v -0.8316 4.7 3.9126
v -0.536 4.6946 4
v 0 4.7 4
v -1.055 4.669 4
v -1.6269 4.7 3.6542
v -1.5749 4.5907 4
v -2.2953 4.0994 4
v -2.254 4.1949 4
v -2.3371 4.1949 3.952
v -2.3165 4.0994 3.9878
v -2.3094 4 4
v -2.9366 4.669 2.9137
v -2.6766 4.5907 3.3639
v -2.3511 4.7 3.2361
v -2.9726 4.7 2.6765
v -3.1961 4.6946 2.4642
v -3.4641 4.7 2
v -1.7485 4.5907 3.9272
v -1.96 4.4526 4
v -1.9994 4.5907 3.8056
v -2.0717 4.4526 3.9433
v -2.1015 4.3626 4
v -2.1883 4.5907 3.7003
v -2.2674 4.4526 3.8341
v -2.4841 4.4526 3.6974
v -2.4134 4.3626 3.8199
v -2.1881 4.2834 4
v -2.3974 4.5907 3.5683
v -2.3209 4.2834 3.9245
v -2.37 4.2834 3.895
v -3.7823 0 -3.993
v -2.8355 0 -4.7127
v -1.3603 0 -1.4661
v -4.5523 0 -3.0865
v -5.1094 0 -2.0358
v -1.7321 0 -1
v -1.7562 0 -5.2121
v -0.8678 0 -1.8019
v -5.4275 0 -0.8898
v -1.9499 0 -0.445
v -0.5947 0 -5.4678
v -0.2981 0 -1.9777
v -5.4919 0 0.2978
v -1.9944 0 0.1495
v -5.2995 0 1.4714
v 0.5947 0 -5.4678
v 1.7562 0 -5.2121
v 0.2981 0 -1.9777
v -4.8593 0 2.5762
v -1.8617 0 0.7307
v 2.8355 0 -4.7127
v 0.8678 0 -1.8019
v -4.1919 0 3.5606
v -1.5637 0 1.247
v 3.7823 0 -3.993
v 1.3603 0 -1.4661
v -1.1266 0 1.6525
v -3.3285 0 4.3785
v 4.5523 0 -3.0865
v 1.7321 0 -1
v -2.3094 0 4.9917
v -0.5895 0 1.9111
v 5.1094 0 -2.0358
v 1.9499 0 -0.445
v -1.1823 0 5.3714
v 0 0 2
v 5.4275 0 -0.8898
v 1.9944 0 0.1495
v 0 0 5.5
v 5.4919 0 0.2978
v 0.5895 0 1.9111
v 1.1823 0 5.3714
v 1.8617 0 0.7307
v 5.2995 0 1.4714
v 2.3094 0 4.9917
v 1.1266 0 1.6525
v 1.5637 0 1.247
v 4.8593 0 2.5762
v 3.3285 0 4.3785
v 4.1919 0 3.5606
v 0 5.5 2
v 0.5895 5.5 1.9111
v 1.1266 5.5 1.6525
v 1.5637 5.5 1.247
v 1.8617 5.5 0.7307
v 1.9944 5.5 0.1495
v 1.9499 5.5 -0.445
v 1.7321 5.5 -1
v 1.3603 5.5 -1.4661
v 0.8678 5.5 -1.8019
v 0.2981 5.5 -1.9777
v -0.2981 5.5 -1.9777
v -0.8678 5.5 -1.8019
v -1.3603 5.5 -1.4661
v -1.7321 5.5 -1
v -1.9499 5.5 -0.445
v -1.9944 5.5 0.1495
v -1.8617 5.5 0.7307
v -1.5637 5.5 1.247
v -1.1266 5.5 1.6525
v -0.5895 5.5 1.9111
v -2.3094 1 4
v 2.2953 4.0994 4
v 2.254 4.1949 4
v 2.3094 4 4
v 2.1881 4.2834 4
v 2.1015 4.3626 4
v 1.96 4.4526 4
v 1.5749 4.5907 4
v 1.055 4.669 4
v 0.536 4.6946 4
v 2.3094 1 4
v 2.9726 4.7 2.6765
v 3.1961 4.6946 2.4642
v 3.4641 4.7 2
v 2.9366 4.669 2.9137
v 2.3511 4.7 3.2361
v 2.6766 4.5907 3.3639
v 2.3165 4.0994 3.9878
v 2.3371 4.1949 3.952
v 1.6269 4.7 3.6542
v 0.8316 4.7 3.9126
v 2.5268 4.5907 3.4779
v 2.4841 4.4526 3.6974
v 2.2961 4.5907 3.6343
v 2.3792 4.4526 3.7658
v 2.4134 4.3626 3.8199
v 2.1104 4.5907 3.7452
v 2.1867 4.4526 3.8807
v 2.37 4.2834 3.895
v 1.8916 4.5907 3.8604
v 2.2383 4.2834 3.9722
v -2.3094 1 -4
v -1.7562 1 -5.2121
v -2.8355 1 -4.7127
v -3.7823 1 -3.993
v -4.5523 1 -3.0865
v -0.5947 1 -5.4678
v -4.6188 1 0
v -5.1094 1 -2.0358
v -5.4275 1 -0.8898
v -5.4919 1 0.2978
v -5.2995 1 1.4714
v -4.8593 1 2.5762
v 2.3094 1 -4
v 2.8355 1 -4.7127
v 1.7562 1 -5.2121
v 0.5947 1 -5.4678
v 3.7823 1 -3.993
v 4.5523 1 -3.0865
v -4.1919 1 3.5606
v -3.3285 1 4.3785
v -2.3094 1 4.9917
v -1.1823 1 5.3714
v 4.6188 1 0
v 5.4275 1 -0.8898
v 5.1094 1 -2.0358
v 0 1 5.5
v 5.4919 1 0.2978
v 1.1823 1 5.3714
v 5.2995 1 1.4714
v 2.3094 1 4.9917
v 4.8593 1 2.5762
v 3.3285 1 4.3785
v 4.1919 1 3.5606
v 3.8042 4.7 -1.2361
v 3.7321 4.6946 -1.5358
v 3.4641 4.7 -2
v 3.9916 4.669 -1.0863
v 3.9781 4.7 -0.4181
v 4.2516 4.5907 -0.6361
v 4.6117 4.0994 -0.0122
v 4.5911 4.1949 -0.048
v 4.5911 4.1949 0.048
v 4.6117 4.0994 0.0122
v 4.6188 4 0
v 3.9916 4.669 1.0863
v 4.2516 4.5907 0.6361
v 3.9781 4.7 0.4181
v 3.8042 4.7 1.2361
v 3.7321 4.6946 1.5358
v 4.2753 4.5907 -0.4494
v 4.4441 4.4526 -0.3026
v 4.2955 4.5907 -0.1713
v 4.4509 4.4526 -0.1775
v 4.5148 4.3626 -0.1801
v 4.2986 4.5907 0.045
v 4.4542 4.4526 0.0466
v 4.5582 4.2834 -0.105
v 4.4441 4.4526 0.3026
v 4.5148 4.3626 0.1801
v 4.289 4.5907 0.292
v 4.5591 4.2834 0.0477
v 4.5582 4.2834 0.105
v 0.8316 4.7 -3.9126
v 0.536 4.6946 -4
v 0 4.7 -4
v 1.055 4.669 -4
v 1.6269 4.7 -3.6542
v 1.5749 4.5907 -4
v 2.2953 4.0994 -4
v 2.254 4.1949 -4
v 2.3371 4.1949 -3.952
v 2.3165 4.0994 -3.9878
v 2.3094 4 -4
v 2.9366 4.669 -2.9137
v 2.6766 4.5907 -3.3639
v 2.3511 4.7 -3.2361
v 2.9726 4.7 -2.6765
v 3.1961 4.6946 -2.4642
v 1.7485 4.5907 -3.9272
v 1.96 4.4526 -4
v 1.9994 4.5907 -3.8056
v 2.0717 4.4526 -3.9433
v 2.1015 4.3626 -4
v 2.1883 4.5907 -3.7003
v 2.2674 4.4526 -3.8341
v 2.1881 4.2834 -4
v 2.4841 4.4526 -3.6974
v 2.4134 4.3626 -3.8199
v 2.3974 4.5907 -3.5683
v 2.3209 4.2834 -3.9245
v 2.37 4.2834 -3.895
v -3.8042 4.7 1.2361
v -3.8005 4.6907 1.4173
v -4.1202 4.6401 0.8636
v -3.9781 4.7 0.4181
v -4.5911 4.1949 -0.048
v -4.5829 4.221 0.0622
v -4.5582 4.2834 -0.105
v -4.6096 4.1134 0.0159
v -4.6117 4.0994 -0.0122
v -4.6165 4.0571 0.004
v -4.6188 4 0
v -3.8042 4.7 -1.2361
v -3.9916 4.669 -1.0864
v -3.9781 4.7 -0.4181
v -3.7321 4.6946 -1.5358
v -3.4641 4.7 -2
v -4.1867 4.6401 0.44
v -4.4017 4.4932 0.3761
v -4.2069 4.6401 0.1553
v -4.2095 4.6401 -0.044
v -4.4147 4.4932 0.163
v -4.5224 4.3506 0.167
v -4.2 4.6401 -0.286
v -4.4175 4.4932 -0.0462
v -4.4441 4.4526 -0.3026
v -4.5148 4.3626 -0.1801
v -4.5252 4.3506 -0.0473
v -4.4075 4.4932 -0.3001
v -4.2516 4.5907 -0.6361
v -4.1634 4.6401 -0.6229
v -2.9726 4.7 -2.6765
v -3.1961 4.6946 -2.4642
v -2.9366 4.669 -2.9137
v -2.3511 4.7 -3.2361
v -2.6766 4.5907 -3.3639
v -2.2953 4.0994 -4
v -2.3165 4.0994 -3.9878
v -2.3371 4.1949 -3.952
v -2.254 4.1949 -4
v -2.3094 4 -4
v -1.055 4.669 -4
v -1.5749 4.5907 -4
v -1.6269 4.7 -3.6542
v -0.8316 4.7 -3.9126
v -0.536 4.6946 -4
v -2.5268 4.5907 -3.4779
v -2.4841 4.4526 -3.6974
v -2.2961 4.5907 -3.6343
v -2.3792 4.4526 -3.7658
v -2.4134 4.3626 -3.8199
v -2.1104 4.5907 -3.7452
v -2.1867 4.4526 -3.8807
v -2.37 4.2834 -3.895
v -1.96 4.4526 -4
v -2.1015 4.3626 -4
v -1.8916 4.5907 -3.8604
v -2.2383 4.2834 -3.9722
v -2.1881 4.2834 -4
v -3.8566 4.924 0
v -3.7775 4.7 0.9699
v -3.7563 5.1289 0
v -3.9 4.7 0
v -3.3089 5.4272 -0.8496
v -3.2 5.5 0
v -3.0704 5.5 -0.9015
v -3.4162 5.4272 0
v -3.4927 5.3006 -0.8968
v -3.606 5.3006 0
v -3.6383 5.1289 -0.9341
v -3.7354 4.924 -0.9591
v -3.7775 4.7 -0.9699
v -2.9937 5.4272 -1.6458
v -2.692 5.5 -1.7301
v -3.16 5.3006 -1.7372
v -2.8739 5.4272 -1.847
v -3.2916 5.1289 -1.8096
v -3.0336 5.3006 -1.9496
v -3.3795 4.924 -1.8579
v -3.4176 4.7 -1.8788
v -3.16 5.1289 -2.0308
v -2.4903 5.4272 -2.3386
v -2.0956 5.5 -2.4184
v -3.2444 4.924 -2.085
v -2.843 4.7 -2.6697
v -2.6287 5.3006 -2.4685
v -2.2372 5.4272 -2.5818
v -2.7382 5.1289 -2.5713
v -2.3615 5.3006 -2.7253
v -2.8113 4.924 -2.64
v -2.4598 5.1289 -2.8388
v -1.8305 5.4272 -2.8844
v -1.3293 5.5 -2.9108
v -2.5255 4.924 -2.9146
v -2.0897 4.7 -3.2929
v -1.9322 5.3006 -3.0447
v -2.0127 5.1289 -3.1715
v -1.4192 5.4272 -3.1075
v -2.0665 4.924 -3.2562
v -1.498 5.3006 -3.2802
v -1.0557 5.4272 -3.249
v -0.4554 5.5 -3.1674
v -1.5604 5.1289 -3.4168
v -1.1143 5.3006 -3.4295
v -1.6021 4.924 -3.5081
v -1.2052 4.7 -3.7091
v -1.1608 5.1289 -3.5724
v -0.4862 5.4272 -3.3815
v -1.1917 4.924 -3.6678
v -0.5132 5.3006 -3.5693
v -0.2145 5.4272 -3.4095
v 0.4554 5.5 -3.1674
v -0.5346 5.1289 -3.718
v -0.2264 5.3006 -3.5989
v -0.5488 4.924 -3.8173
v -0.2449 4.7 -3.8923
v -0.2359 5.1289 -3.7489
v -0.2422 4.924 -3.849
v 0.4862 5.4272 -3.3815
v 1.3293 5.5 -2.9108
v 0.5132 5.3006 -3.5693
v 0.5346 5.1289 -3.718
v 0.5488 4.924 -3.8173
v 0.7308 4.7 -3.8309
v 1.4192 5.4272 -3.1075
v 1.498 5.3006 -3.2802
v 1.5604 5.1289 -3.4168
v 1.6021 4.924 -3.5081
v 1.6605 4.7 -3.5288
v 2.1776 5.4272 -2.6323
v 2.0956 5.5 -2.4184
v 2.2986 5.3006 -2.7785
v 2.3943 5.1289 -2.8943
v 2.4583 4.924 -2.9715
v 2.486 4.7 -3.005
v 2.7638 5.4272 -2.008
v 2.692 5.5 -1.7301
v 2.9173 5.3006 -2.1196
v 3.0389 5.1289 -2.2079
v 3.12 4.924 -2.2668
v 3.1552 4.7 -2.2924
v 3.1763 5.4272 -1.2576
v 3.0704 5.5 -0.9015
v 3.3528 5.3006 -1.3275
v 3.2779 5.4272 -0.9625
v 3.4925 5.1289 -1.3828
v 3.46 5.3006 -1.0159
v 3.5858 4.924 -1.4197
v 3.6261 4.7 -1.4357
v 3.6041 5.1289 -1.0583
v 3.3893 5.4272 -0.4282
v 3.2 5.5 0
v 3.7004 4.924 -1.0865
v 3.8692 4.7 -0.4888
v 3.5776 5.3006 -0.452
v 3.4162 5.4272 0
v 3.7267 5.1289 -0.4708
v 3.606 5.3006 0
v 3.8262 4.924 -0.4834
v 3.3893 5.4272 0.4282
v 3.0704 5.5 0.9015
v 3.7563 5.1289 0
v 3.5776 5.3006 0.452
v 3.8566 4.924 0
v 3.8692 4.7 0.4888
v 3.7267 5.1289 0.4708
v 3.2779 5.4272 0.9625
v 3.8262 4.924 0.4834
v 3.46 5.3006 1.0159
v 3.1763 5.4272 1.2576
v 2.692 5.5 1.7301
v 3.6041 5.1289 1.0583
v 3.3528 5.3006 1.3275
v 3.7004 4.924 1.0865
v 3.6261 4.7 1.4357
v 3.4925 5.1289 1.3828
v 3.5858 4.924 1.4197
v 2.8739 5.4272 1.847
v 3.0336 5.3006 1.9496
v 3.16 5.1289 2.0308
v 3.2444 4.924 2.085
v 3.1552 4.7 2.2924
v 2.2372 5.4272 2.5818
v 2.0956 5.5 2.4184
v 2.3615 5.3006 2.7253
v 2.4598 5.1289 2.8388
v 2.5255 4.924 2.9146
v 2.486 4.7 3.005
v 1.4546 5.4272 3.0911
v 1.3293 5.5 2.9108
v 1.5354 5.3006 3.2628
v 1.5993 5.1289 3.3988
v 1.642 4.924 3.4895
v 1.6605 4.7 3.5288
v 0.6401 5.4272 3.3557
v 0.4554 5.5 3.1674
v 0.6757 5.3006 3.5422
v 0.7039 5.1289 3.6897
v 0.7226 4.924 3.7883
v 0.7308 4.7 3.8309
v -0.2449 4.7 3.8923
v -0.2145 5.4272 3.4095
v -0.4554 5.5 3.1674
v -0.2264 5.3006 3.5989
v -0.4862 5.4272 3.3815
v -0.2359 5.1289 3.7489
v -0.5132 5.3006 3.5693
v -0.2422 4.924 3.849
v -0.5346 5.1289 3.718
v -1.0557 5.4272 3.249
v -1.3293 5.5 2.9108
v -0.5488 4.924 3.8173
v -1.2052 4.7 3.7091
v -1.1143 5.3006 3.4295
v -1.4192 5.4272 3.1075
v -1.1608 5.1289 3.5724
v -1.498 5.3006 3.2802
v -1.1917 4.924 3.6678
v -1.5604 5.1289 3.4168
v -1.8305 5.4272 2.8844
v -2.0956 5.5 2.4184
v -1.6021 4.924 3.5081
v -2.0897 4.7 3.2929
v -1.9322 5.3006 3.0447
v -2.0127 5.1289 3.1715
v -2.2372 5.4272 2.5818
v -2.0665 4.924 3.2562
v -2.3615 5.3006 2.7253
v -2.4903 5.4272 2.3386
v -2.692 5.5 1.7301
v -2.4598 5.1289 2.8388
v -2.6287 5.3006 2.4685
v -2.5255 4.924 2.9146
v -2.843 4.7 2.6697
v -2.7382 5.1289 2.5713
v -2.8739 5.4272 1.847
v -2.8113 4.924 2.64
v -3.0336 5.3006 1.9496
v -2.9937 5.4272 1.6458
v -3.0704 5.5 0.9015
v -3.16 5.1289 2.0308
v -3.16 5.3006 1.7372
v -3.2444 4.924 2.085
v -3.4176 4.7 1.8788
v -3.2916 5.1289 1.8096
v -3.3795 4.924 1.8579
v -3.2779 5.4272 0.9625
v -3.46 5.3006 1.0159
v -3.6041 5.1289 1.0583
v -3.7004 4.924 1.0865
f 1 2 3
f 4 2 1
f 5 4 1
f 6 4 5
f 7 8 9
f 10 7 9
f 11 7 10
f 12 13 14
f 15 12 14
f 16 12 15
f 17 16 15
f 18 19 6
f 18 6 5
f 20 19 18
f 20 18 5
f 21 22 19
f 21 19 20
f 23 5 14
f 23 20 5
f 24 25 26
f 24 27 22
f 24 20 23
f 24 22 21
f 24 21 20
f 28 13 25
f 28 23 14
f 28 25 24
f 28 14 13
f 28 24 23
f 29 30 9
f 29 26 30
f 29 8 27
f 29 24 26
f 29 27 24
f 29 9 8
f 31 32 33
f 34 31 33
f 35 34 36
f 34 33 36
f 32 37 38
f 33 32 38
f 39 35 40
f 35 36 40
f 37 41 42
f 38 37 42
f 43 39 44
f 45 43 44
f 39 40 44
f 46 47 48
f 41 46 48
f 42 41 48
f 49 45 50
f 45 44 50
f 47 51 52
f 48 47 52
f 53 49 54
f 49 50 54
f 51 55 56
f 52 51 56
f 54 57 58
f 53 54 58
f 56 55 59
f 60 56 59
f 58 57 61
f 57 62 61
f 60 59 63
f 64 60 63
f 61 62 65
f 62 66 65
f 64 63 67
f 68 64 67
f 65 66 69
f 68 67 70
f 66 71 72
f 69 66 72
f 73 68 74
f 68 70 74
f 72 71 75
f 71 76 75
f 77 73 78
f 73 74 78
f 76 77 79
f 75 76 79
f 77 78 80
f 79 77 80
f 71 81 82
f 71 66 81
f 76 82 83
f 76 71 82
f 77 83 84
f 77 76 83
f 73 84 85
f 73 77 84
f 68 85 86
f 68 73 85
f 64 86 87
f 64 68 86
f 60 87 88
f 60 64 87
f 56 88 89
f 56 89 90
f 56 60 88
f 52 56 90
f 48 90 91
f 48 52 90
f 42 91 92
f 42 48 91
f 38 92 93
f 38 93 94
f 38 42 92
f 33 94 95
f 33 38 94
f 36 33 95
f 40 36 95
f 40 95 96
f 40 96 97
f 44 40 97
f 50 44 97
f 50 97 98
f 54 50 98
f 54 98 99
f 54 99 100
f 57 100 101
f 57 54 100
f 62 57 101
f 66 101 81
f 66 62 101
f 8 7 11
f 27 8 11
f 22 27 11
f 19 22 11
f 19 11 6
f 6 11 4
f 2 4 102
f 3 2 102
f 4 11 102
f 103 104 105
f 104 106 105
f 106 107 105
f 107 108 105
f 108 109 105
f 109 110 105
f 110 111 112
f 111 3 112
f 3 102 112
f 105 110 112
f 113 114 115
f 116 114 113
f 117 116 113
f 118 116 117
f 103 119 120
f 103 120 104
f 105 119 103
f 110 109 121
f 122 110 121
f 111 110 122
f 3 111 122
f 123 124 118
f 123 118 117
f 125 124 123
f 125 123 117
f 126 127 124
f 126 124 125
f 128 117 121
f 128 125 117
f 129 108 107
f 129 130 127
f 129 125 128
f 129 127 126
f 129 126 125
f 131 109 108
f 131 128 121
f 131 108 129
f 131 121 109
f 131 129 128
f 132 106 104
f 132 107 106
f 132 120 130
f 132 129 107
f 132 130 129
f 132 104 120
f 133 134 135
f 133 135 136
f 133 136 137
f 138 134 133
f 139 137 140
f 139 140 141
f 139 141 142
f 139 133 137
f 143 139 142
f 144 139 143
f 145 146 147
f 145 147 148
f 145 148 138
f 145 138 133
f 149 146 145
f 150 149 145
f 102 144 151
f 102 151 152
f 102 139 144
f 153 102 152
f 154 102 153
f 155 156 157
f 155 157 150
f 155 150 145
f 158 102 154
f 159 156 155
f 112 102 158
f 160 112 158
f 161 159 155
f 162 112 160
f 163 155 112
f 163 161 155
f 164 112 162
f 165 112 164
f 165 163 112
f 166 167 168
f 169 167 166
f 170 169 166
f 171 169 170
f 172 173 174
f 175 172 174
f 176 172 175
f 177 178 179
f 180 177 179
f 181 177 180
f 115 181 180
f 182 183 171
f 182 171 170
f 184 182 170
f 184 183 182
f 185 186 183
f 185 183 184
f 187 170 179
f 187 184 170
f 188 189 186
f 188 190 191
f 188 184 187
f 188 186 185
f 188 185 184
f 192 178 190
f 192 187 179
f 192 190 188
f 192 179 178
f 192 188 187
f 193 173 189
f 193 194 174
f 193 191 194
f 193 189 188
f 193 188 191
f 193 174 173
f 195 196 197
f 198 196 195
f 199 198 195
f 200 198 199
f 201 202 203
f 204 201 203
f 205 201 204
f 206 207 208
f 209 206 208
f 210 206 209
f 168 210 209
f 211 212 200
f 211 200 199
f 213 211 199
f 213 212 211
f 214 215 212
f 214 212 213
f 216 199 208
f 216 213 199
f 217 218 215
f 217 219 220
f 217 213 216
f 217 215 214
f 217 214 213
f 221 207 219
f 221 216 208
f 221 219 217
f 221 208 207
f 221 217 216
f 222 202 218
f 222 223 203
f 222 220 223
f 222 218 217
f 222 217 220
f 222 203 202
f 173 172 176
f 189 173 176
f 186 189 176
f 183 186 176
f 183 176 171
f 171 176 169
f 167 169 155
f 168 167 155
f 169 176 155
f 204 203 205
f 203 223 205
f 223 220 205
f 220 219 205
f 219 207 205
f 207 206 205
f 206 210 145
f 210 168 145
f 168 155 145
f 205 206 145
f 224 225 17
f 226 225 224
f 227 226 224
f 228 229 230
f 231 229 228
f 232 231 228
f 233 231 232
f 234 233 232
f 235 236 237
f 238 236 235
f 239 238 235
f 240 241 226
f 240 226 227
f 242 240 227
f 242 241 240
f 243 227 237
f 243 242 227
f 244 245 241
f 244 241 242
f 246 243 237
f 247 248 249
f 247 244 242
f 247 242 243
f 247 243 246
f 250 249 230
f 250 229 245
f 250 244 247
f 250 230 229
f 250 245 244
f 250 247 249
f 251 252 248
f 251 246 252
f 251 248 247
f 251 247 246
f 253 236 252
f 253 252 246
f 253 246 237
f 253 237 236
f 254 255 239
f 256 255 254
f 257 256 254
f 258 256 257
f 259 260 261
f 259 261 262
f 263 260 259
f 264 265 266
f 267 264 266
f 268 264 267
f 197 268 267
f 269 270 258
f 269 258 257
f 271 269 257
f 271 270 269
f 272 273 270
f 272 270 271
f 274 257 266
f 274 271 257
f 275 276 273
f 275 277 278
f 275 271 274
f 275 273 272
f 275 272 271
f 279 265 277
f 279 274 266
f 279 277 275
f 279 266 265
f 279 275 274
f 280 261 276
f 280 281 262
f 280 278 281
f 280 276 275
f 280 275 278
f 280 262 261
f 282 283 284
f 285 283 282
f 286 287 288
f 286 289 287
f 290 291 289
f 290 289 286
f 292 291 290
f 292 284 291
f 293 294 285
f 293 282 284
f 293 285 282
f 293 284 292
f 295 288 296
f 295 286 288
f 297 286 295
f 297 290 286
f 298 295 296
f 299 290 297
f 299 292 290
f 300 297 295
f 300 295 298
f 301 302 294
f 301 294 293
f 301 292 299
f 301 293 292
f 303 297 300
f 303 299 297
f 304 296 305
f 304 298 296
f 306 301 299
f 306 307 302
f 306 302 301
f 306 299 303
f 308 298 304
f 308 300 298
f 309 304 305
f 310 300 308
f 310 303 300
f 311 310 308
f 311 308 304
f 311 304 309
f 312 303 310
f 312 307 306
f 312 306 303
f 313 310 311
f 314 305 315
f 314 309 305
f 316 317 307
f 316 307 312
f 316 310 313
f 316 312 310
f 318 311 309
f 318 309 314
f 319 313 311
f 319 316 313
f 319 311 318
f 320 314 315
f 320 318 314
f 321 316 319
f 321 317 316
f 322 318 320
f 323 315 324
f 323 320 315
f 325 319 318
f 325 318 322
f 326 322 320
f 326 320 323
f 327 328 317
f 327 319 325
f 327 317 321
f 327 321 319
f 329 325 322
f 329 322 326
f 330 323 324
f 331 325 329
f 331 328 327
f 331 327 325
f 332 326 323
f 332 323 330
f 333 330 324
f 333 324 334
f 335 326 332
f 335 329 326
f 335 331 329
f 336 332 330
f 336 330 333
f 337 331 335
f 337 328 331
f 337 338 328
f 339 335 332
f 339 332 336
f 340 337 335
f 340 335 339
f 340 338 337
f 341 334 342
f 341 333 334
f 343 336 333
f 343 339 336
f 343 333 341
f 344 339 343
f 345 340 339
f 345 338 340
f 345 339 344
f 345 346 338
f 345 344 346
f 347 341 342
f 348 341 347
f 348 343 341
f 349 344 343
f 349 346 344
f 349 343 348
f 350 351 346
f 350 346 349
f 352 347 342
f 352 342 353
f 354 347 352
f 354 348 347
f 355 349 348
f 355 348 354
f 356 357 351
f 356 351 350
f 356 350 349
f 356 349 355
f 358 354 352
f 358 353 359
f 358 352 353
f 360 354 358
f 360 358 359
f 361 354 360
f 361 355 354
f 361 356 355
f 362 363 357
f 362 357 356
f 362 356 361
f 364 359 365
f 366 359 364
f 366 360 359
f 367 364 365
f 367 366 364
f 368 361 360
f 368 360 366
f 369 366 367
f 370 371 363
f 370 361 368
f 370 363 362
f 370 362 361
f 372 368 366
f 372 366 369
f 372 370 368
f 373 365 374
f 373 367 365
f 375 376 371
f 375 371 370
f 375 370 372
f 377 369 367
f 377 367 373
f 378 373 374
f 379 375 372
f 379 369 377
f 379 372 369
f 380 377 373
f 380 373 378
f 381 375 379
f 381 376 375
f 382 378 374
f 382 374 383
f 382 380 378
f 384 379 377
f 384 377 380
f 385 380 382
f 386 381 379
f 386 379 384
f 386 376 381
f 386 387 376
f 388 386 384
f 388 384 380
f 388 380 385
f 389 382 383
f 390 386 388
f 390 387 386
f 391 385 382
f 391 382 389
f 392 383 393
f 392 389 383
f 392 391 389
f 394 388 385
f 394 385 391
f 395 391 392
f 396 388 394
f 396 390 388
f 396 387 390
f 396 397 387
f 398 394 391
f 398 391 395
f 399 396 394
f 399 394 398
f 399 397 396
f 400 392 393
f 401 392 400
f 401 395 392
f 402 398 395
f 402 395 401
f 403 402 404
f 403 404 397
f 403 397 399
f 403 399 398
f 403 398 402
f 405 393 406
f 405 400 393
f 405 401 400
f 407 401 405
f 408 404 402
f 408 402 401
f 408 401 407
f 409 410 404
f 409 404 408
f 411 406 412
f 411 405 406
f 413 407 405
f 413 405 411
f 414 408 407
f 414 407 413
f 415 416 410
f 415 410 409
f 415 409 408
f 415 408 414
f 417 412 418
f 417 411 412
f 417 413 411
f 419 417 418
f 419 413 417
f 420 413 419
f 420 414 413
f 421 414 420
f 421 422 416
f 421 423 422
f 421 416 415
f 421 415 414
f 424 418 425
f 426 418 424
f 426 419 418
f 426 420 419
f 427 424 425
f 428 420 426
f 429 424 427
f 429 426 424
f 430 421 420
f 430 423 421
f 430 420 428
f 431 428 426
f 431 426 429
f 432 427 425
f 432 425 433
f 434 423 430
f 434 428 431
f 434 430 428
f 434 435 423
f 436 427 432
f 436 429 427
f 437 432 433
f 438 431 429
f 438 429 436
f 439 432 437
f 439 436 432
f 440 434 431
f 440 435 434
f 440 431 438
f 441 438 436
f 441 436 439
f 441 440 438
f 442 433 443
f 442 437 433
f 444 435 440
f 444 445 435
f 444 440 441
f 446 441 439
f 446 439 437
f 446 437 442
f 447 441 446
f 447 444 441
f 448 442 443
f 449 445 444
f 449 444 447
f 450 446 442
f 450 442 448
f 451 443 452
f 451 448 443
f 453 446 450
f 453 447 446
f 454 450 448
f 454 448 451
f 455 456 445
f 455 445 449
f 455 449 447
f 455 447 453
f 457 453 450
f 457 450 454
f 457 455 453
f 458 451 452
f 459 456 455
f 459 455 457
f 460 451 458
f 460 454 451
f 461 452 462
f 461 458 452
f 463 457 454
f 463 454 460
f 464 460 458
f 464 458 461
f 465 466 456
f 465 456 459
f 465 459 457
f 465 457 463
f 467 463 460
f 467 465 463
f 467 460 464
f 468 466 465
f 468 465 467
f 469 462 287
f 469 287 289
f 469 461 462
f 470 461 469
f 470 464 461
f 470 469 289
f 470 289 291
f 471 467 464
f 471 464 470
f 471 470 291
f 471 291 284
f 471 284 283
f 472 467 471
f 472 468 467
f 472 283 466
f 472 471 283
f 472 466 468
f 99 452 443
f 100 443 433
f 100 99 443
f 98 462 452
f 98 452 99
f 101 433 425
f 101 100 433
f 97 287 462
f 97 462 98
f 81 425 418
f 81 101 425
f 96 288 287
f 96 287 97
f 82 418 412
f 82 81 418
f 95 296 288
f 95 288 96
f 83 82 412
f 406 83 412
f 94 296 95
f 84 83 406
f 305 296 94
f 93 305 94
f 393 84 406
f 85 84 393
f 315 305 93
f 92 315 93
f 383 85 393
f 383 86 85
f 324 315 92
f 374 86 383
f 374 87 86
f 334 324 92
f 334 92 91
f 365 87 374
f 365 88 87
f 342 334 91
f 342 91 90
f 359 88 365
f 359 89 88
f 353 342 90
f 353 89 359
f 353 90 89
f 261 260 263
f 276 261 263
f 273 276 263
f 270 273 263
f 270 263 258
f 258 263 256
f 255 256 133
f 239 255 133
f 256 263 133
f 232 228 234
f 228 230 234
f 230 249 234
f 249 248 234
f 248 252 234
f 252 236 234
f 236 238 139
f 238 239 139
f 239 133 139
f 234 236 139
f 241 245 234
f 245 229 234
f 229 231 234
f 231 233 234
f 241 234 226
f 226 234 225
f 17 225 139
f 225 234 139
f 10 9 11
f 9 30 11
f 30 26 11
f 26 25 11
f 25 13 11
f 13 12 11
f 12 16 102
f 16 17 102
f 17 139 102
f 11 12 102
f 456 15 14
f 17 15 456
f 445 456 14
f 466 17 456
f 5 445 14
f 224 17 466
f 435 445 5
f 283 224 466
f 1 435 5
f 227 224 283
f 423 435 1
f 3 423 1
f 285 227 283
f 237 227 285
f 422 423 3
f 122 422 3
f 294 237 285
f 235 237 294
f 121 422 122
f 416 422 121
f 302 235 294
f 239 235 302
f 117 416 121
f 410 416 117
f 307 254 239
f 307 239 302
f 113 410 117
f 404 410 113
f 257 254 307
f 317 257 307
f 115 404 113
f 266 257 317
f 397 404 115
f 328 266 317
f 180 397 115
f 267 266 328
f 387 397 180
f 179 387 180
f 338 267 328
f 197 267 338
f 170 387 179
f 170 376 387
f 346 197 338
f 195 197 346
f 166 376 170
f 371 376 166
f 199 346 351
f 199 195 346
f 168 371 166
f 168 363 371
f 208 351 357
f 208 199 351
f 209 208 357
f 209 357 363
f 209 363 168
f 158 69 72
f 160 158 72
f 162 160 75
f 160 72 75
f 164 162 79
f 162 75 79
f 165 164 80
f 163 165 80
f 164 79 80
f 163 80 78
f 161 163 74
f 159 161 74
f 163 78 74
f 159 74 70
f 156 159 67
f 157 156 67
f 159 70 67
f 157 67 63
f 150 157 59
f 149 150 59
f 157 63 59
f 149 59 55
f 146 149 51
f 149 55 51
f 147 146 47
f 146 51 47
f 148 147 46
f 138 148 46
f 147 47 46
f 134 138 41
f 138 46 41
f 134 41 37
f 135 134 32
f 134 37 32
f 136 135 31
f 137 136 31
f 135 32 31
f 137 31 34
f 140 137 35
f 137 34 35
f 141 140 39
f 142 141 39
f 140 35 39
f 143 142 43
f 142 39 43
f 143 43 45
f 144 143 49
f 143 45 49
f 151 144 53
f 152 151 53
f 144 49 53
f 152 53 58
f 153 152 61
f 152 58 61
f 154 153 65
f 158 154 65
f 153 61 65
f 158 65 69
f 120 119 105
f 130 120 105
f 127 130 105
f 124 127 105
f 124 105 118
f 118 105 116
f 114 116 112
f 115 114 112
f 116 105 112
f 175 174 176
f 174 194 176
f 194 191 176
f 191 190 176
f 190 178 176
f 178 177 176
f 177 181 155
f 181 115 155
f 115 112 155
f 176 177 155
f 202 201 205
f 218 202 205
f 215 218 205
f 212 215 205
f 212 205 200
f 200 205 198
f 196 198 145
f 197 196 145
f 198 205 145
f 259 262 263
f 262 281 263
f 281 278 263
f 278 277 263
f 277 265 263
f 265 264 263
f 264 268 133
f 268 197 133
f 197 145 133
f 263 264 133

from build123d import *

# Parameters (mm, degrees)
SKETCH_1_R      = 5.5
SKETCH_1_R_2    = 2
EXTRUDE_1_DEPTH = 1
SKETCH_2_R      = 2
EXTRUDE_2_DEPTH = 4.5


with BuildPart() as part:
    # 草图1 → 凸台-拉伸1 (new body)
    with BuildSketch(Plane(origin=(0, 0, 0), x_dir=(1, 0, 0), z_dir=(0, 1, 0))):
        with Locations(Location((0, 0, 0), (0, 0, 270))):
            Circle(SKETCH_1_R)
        with Locations(Location((0, 0, 0), (0, 0, 270))):
            Circle(SKETCH_1_R_2, mode=Mode.SUBTRACT)
    extrude(amount=EXTRUDE_1_DEPTH)

    # 草图2 → 凸台-拉伸2 (add)
    with BuildSketch(Plane(origin=(0, 1, 0), x_dir=(1, 0, 0), z_dir=(0, 1, 0))):
        Polygon((4.618802154, 0), (2.309401077, 4), (-2.309401077, 4), (-4.618802154, 0), (-2.309401077, -4), (2.309401077, -4), align=None)
        with Locations(Location((0, 0, 0), (0, 0, 270))):
            Circle(SKETCH_2_R, mode=Mode.SUBTRACT)
    extrude(amount=EXTRUDE_2_DEPTH)

    # 草图3 → 切除-旋转1 (revolve, cut)
    with BuildSketch(Plane.XY):
        with BuildLine():
            ThreePointArc((-3.2, 5.5), (-3.686821507, 5.219718819), (-3.9, 4.7))
            Line((-3.9, 4.7), (-4, 4.7))
            ThreePointArc((-4, 4.7), (-4.441923124, 4.467149897), (-4.618802154, 4))
            Line((-4.618802154, 4), (-4.618802154, 5.5))
            Line((-4.618802154, 5.5), (-3.2, 5.5))
        make_face()
    revolve(axis=Axis((0, 5.5, 0), (0, -1, 0)), mode=Mode.SUBTRACT)


solid = part.part
